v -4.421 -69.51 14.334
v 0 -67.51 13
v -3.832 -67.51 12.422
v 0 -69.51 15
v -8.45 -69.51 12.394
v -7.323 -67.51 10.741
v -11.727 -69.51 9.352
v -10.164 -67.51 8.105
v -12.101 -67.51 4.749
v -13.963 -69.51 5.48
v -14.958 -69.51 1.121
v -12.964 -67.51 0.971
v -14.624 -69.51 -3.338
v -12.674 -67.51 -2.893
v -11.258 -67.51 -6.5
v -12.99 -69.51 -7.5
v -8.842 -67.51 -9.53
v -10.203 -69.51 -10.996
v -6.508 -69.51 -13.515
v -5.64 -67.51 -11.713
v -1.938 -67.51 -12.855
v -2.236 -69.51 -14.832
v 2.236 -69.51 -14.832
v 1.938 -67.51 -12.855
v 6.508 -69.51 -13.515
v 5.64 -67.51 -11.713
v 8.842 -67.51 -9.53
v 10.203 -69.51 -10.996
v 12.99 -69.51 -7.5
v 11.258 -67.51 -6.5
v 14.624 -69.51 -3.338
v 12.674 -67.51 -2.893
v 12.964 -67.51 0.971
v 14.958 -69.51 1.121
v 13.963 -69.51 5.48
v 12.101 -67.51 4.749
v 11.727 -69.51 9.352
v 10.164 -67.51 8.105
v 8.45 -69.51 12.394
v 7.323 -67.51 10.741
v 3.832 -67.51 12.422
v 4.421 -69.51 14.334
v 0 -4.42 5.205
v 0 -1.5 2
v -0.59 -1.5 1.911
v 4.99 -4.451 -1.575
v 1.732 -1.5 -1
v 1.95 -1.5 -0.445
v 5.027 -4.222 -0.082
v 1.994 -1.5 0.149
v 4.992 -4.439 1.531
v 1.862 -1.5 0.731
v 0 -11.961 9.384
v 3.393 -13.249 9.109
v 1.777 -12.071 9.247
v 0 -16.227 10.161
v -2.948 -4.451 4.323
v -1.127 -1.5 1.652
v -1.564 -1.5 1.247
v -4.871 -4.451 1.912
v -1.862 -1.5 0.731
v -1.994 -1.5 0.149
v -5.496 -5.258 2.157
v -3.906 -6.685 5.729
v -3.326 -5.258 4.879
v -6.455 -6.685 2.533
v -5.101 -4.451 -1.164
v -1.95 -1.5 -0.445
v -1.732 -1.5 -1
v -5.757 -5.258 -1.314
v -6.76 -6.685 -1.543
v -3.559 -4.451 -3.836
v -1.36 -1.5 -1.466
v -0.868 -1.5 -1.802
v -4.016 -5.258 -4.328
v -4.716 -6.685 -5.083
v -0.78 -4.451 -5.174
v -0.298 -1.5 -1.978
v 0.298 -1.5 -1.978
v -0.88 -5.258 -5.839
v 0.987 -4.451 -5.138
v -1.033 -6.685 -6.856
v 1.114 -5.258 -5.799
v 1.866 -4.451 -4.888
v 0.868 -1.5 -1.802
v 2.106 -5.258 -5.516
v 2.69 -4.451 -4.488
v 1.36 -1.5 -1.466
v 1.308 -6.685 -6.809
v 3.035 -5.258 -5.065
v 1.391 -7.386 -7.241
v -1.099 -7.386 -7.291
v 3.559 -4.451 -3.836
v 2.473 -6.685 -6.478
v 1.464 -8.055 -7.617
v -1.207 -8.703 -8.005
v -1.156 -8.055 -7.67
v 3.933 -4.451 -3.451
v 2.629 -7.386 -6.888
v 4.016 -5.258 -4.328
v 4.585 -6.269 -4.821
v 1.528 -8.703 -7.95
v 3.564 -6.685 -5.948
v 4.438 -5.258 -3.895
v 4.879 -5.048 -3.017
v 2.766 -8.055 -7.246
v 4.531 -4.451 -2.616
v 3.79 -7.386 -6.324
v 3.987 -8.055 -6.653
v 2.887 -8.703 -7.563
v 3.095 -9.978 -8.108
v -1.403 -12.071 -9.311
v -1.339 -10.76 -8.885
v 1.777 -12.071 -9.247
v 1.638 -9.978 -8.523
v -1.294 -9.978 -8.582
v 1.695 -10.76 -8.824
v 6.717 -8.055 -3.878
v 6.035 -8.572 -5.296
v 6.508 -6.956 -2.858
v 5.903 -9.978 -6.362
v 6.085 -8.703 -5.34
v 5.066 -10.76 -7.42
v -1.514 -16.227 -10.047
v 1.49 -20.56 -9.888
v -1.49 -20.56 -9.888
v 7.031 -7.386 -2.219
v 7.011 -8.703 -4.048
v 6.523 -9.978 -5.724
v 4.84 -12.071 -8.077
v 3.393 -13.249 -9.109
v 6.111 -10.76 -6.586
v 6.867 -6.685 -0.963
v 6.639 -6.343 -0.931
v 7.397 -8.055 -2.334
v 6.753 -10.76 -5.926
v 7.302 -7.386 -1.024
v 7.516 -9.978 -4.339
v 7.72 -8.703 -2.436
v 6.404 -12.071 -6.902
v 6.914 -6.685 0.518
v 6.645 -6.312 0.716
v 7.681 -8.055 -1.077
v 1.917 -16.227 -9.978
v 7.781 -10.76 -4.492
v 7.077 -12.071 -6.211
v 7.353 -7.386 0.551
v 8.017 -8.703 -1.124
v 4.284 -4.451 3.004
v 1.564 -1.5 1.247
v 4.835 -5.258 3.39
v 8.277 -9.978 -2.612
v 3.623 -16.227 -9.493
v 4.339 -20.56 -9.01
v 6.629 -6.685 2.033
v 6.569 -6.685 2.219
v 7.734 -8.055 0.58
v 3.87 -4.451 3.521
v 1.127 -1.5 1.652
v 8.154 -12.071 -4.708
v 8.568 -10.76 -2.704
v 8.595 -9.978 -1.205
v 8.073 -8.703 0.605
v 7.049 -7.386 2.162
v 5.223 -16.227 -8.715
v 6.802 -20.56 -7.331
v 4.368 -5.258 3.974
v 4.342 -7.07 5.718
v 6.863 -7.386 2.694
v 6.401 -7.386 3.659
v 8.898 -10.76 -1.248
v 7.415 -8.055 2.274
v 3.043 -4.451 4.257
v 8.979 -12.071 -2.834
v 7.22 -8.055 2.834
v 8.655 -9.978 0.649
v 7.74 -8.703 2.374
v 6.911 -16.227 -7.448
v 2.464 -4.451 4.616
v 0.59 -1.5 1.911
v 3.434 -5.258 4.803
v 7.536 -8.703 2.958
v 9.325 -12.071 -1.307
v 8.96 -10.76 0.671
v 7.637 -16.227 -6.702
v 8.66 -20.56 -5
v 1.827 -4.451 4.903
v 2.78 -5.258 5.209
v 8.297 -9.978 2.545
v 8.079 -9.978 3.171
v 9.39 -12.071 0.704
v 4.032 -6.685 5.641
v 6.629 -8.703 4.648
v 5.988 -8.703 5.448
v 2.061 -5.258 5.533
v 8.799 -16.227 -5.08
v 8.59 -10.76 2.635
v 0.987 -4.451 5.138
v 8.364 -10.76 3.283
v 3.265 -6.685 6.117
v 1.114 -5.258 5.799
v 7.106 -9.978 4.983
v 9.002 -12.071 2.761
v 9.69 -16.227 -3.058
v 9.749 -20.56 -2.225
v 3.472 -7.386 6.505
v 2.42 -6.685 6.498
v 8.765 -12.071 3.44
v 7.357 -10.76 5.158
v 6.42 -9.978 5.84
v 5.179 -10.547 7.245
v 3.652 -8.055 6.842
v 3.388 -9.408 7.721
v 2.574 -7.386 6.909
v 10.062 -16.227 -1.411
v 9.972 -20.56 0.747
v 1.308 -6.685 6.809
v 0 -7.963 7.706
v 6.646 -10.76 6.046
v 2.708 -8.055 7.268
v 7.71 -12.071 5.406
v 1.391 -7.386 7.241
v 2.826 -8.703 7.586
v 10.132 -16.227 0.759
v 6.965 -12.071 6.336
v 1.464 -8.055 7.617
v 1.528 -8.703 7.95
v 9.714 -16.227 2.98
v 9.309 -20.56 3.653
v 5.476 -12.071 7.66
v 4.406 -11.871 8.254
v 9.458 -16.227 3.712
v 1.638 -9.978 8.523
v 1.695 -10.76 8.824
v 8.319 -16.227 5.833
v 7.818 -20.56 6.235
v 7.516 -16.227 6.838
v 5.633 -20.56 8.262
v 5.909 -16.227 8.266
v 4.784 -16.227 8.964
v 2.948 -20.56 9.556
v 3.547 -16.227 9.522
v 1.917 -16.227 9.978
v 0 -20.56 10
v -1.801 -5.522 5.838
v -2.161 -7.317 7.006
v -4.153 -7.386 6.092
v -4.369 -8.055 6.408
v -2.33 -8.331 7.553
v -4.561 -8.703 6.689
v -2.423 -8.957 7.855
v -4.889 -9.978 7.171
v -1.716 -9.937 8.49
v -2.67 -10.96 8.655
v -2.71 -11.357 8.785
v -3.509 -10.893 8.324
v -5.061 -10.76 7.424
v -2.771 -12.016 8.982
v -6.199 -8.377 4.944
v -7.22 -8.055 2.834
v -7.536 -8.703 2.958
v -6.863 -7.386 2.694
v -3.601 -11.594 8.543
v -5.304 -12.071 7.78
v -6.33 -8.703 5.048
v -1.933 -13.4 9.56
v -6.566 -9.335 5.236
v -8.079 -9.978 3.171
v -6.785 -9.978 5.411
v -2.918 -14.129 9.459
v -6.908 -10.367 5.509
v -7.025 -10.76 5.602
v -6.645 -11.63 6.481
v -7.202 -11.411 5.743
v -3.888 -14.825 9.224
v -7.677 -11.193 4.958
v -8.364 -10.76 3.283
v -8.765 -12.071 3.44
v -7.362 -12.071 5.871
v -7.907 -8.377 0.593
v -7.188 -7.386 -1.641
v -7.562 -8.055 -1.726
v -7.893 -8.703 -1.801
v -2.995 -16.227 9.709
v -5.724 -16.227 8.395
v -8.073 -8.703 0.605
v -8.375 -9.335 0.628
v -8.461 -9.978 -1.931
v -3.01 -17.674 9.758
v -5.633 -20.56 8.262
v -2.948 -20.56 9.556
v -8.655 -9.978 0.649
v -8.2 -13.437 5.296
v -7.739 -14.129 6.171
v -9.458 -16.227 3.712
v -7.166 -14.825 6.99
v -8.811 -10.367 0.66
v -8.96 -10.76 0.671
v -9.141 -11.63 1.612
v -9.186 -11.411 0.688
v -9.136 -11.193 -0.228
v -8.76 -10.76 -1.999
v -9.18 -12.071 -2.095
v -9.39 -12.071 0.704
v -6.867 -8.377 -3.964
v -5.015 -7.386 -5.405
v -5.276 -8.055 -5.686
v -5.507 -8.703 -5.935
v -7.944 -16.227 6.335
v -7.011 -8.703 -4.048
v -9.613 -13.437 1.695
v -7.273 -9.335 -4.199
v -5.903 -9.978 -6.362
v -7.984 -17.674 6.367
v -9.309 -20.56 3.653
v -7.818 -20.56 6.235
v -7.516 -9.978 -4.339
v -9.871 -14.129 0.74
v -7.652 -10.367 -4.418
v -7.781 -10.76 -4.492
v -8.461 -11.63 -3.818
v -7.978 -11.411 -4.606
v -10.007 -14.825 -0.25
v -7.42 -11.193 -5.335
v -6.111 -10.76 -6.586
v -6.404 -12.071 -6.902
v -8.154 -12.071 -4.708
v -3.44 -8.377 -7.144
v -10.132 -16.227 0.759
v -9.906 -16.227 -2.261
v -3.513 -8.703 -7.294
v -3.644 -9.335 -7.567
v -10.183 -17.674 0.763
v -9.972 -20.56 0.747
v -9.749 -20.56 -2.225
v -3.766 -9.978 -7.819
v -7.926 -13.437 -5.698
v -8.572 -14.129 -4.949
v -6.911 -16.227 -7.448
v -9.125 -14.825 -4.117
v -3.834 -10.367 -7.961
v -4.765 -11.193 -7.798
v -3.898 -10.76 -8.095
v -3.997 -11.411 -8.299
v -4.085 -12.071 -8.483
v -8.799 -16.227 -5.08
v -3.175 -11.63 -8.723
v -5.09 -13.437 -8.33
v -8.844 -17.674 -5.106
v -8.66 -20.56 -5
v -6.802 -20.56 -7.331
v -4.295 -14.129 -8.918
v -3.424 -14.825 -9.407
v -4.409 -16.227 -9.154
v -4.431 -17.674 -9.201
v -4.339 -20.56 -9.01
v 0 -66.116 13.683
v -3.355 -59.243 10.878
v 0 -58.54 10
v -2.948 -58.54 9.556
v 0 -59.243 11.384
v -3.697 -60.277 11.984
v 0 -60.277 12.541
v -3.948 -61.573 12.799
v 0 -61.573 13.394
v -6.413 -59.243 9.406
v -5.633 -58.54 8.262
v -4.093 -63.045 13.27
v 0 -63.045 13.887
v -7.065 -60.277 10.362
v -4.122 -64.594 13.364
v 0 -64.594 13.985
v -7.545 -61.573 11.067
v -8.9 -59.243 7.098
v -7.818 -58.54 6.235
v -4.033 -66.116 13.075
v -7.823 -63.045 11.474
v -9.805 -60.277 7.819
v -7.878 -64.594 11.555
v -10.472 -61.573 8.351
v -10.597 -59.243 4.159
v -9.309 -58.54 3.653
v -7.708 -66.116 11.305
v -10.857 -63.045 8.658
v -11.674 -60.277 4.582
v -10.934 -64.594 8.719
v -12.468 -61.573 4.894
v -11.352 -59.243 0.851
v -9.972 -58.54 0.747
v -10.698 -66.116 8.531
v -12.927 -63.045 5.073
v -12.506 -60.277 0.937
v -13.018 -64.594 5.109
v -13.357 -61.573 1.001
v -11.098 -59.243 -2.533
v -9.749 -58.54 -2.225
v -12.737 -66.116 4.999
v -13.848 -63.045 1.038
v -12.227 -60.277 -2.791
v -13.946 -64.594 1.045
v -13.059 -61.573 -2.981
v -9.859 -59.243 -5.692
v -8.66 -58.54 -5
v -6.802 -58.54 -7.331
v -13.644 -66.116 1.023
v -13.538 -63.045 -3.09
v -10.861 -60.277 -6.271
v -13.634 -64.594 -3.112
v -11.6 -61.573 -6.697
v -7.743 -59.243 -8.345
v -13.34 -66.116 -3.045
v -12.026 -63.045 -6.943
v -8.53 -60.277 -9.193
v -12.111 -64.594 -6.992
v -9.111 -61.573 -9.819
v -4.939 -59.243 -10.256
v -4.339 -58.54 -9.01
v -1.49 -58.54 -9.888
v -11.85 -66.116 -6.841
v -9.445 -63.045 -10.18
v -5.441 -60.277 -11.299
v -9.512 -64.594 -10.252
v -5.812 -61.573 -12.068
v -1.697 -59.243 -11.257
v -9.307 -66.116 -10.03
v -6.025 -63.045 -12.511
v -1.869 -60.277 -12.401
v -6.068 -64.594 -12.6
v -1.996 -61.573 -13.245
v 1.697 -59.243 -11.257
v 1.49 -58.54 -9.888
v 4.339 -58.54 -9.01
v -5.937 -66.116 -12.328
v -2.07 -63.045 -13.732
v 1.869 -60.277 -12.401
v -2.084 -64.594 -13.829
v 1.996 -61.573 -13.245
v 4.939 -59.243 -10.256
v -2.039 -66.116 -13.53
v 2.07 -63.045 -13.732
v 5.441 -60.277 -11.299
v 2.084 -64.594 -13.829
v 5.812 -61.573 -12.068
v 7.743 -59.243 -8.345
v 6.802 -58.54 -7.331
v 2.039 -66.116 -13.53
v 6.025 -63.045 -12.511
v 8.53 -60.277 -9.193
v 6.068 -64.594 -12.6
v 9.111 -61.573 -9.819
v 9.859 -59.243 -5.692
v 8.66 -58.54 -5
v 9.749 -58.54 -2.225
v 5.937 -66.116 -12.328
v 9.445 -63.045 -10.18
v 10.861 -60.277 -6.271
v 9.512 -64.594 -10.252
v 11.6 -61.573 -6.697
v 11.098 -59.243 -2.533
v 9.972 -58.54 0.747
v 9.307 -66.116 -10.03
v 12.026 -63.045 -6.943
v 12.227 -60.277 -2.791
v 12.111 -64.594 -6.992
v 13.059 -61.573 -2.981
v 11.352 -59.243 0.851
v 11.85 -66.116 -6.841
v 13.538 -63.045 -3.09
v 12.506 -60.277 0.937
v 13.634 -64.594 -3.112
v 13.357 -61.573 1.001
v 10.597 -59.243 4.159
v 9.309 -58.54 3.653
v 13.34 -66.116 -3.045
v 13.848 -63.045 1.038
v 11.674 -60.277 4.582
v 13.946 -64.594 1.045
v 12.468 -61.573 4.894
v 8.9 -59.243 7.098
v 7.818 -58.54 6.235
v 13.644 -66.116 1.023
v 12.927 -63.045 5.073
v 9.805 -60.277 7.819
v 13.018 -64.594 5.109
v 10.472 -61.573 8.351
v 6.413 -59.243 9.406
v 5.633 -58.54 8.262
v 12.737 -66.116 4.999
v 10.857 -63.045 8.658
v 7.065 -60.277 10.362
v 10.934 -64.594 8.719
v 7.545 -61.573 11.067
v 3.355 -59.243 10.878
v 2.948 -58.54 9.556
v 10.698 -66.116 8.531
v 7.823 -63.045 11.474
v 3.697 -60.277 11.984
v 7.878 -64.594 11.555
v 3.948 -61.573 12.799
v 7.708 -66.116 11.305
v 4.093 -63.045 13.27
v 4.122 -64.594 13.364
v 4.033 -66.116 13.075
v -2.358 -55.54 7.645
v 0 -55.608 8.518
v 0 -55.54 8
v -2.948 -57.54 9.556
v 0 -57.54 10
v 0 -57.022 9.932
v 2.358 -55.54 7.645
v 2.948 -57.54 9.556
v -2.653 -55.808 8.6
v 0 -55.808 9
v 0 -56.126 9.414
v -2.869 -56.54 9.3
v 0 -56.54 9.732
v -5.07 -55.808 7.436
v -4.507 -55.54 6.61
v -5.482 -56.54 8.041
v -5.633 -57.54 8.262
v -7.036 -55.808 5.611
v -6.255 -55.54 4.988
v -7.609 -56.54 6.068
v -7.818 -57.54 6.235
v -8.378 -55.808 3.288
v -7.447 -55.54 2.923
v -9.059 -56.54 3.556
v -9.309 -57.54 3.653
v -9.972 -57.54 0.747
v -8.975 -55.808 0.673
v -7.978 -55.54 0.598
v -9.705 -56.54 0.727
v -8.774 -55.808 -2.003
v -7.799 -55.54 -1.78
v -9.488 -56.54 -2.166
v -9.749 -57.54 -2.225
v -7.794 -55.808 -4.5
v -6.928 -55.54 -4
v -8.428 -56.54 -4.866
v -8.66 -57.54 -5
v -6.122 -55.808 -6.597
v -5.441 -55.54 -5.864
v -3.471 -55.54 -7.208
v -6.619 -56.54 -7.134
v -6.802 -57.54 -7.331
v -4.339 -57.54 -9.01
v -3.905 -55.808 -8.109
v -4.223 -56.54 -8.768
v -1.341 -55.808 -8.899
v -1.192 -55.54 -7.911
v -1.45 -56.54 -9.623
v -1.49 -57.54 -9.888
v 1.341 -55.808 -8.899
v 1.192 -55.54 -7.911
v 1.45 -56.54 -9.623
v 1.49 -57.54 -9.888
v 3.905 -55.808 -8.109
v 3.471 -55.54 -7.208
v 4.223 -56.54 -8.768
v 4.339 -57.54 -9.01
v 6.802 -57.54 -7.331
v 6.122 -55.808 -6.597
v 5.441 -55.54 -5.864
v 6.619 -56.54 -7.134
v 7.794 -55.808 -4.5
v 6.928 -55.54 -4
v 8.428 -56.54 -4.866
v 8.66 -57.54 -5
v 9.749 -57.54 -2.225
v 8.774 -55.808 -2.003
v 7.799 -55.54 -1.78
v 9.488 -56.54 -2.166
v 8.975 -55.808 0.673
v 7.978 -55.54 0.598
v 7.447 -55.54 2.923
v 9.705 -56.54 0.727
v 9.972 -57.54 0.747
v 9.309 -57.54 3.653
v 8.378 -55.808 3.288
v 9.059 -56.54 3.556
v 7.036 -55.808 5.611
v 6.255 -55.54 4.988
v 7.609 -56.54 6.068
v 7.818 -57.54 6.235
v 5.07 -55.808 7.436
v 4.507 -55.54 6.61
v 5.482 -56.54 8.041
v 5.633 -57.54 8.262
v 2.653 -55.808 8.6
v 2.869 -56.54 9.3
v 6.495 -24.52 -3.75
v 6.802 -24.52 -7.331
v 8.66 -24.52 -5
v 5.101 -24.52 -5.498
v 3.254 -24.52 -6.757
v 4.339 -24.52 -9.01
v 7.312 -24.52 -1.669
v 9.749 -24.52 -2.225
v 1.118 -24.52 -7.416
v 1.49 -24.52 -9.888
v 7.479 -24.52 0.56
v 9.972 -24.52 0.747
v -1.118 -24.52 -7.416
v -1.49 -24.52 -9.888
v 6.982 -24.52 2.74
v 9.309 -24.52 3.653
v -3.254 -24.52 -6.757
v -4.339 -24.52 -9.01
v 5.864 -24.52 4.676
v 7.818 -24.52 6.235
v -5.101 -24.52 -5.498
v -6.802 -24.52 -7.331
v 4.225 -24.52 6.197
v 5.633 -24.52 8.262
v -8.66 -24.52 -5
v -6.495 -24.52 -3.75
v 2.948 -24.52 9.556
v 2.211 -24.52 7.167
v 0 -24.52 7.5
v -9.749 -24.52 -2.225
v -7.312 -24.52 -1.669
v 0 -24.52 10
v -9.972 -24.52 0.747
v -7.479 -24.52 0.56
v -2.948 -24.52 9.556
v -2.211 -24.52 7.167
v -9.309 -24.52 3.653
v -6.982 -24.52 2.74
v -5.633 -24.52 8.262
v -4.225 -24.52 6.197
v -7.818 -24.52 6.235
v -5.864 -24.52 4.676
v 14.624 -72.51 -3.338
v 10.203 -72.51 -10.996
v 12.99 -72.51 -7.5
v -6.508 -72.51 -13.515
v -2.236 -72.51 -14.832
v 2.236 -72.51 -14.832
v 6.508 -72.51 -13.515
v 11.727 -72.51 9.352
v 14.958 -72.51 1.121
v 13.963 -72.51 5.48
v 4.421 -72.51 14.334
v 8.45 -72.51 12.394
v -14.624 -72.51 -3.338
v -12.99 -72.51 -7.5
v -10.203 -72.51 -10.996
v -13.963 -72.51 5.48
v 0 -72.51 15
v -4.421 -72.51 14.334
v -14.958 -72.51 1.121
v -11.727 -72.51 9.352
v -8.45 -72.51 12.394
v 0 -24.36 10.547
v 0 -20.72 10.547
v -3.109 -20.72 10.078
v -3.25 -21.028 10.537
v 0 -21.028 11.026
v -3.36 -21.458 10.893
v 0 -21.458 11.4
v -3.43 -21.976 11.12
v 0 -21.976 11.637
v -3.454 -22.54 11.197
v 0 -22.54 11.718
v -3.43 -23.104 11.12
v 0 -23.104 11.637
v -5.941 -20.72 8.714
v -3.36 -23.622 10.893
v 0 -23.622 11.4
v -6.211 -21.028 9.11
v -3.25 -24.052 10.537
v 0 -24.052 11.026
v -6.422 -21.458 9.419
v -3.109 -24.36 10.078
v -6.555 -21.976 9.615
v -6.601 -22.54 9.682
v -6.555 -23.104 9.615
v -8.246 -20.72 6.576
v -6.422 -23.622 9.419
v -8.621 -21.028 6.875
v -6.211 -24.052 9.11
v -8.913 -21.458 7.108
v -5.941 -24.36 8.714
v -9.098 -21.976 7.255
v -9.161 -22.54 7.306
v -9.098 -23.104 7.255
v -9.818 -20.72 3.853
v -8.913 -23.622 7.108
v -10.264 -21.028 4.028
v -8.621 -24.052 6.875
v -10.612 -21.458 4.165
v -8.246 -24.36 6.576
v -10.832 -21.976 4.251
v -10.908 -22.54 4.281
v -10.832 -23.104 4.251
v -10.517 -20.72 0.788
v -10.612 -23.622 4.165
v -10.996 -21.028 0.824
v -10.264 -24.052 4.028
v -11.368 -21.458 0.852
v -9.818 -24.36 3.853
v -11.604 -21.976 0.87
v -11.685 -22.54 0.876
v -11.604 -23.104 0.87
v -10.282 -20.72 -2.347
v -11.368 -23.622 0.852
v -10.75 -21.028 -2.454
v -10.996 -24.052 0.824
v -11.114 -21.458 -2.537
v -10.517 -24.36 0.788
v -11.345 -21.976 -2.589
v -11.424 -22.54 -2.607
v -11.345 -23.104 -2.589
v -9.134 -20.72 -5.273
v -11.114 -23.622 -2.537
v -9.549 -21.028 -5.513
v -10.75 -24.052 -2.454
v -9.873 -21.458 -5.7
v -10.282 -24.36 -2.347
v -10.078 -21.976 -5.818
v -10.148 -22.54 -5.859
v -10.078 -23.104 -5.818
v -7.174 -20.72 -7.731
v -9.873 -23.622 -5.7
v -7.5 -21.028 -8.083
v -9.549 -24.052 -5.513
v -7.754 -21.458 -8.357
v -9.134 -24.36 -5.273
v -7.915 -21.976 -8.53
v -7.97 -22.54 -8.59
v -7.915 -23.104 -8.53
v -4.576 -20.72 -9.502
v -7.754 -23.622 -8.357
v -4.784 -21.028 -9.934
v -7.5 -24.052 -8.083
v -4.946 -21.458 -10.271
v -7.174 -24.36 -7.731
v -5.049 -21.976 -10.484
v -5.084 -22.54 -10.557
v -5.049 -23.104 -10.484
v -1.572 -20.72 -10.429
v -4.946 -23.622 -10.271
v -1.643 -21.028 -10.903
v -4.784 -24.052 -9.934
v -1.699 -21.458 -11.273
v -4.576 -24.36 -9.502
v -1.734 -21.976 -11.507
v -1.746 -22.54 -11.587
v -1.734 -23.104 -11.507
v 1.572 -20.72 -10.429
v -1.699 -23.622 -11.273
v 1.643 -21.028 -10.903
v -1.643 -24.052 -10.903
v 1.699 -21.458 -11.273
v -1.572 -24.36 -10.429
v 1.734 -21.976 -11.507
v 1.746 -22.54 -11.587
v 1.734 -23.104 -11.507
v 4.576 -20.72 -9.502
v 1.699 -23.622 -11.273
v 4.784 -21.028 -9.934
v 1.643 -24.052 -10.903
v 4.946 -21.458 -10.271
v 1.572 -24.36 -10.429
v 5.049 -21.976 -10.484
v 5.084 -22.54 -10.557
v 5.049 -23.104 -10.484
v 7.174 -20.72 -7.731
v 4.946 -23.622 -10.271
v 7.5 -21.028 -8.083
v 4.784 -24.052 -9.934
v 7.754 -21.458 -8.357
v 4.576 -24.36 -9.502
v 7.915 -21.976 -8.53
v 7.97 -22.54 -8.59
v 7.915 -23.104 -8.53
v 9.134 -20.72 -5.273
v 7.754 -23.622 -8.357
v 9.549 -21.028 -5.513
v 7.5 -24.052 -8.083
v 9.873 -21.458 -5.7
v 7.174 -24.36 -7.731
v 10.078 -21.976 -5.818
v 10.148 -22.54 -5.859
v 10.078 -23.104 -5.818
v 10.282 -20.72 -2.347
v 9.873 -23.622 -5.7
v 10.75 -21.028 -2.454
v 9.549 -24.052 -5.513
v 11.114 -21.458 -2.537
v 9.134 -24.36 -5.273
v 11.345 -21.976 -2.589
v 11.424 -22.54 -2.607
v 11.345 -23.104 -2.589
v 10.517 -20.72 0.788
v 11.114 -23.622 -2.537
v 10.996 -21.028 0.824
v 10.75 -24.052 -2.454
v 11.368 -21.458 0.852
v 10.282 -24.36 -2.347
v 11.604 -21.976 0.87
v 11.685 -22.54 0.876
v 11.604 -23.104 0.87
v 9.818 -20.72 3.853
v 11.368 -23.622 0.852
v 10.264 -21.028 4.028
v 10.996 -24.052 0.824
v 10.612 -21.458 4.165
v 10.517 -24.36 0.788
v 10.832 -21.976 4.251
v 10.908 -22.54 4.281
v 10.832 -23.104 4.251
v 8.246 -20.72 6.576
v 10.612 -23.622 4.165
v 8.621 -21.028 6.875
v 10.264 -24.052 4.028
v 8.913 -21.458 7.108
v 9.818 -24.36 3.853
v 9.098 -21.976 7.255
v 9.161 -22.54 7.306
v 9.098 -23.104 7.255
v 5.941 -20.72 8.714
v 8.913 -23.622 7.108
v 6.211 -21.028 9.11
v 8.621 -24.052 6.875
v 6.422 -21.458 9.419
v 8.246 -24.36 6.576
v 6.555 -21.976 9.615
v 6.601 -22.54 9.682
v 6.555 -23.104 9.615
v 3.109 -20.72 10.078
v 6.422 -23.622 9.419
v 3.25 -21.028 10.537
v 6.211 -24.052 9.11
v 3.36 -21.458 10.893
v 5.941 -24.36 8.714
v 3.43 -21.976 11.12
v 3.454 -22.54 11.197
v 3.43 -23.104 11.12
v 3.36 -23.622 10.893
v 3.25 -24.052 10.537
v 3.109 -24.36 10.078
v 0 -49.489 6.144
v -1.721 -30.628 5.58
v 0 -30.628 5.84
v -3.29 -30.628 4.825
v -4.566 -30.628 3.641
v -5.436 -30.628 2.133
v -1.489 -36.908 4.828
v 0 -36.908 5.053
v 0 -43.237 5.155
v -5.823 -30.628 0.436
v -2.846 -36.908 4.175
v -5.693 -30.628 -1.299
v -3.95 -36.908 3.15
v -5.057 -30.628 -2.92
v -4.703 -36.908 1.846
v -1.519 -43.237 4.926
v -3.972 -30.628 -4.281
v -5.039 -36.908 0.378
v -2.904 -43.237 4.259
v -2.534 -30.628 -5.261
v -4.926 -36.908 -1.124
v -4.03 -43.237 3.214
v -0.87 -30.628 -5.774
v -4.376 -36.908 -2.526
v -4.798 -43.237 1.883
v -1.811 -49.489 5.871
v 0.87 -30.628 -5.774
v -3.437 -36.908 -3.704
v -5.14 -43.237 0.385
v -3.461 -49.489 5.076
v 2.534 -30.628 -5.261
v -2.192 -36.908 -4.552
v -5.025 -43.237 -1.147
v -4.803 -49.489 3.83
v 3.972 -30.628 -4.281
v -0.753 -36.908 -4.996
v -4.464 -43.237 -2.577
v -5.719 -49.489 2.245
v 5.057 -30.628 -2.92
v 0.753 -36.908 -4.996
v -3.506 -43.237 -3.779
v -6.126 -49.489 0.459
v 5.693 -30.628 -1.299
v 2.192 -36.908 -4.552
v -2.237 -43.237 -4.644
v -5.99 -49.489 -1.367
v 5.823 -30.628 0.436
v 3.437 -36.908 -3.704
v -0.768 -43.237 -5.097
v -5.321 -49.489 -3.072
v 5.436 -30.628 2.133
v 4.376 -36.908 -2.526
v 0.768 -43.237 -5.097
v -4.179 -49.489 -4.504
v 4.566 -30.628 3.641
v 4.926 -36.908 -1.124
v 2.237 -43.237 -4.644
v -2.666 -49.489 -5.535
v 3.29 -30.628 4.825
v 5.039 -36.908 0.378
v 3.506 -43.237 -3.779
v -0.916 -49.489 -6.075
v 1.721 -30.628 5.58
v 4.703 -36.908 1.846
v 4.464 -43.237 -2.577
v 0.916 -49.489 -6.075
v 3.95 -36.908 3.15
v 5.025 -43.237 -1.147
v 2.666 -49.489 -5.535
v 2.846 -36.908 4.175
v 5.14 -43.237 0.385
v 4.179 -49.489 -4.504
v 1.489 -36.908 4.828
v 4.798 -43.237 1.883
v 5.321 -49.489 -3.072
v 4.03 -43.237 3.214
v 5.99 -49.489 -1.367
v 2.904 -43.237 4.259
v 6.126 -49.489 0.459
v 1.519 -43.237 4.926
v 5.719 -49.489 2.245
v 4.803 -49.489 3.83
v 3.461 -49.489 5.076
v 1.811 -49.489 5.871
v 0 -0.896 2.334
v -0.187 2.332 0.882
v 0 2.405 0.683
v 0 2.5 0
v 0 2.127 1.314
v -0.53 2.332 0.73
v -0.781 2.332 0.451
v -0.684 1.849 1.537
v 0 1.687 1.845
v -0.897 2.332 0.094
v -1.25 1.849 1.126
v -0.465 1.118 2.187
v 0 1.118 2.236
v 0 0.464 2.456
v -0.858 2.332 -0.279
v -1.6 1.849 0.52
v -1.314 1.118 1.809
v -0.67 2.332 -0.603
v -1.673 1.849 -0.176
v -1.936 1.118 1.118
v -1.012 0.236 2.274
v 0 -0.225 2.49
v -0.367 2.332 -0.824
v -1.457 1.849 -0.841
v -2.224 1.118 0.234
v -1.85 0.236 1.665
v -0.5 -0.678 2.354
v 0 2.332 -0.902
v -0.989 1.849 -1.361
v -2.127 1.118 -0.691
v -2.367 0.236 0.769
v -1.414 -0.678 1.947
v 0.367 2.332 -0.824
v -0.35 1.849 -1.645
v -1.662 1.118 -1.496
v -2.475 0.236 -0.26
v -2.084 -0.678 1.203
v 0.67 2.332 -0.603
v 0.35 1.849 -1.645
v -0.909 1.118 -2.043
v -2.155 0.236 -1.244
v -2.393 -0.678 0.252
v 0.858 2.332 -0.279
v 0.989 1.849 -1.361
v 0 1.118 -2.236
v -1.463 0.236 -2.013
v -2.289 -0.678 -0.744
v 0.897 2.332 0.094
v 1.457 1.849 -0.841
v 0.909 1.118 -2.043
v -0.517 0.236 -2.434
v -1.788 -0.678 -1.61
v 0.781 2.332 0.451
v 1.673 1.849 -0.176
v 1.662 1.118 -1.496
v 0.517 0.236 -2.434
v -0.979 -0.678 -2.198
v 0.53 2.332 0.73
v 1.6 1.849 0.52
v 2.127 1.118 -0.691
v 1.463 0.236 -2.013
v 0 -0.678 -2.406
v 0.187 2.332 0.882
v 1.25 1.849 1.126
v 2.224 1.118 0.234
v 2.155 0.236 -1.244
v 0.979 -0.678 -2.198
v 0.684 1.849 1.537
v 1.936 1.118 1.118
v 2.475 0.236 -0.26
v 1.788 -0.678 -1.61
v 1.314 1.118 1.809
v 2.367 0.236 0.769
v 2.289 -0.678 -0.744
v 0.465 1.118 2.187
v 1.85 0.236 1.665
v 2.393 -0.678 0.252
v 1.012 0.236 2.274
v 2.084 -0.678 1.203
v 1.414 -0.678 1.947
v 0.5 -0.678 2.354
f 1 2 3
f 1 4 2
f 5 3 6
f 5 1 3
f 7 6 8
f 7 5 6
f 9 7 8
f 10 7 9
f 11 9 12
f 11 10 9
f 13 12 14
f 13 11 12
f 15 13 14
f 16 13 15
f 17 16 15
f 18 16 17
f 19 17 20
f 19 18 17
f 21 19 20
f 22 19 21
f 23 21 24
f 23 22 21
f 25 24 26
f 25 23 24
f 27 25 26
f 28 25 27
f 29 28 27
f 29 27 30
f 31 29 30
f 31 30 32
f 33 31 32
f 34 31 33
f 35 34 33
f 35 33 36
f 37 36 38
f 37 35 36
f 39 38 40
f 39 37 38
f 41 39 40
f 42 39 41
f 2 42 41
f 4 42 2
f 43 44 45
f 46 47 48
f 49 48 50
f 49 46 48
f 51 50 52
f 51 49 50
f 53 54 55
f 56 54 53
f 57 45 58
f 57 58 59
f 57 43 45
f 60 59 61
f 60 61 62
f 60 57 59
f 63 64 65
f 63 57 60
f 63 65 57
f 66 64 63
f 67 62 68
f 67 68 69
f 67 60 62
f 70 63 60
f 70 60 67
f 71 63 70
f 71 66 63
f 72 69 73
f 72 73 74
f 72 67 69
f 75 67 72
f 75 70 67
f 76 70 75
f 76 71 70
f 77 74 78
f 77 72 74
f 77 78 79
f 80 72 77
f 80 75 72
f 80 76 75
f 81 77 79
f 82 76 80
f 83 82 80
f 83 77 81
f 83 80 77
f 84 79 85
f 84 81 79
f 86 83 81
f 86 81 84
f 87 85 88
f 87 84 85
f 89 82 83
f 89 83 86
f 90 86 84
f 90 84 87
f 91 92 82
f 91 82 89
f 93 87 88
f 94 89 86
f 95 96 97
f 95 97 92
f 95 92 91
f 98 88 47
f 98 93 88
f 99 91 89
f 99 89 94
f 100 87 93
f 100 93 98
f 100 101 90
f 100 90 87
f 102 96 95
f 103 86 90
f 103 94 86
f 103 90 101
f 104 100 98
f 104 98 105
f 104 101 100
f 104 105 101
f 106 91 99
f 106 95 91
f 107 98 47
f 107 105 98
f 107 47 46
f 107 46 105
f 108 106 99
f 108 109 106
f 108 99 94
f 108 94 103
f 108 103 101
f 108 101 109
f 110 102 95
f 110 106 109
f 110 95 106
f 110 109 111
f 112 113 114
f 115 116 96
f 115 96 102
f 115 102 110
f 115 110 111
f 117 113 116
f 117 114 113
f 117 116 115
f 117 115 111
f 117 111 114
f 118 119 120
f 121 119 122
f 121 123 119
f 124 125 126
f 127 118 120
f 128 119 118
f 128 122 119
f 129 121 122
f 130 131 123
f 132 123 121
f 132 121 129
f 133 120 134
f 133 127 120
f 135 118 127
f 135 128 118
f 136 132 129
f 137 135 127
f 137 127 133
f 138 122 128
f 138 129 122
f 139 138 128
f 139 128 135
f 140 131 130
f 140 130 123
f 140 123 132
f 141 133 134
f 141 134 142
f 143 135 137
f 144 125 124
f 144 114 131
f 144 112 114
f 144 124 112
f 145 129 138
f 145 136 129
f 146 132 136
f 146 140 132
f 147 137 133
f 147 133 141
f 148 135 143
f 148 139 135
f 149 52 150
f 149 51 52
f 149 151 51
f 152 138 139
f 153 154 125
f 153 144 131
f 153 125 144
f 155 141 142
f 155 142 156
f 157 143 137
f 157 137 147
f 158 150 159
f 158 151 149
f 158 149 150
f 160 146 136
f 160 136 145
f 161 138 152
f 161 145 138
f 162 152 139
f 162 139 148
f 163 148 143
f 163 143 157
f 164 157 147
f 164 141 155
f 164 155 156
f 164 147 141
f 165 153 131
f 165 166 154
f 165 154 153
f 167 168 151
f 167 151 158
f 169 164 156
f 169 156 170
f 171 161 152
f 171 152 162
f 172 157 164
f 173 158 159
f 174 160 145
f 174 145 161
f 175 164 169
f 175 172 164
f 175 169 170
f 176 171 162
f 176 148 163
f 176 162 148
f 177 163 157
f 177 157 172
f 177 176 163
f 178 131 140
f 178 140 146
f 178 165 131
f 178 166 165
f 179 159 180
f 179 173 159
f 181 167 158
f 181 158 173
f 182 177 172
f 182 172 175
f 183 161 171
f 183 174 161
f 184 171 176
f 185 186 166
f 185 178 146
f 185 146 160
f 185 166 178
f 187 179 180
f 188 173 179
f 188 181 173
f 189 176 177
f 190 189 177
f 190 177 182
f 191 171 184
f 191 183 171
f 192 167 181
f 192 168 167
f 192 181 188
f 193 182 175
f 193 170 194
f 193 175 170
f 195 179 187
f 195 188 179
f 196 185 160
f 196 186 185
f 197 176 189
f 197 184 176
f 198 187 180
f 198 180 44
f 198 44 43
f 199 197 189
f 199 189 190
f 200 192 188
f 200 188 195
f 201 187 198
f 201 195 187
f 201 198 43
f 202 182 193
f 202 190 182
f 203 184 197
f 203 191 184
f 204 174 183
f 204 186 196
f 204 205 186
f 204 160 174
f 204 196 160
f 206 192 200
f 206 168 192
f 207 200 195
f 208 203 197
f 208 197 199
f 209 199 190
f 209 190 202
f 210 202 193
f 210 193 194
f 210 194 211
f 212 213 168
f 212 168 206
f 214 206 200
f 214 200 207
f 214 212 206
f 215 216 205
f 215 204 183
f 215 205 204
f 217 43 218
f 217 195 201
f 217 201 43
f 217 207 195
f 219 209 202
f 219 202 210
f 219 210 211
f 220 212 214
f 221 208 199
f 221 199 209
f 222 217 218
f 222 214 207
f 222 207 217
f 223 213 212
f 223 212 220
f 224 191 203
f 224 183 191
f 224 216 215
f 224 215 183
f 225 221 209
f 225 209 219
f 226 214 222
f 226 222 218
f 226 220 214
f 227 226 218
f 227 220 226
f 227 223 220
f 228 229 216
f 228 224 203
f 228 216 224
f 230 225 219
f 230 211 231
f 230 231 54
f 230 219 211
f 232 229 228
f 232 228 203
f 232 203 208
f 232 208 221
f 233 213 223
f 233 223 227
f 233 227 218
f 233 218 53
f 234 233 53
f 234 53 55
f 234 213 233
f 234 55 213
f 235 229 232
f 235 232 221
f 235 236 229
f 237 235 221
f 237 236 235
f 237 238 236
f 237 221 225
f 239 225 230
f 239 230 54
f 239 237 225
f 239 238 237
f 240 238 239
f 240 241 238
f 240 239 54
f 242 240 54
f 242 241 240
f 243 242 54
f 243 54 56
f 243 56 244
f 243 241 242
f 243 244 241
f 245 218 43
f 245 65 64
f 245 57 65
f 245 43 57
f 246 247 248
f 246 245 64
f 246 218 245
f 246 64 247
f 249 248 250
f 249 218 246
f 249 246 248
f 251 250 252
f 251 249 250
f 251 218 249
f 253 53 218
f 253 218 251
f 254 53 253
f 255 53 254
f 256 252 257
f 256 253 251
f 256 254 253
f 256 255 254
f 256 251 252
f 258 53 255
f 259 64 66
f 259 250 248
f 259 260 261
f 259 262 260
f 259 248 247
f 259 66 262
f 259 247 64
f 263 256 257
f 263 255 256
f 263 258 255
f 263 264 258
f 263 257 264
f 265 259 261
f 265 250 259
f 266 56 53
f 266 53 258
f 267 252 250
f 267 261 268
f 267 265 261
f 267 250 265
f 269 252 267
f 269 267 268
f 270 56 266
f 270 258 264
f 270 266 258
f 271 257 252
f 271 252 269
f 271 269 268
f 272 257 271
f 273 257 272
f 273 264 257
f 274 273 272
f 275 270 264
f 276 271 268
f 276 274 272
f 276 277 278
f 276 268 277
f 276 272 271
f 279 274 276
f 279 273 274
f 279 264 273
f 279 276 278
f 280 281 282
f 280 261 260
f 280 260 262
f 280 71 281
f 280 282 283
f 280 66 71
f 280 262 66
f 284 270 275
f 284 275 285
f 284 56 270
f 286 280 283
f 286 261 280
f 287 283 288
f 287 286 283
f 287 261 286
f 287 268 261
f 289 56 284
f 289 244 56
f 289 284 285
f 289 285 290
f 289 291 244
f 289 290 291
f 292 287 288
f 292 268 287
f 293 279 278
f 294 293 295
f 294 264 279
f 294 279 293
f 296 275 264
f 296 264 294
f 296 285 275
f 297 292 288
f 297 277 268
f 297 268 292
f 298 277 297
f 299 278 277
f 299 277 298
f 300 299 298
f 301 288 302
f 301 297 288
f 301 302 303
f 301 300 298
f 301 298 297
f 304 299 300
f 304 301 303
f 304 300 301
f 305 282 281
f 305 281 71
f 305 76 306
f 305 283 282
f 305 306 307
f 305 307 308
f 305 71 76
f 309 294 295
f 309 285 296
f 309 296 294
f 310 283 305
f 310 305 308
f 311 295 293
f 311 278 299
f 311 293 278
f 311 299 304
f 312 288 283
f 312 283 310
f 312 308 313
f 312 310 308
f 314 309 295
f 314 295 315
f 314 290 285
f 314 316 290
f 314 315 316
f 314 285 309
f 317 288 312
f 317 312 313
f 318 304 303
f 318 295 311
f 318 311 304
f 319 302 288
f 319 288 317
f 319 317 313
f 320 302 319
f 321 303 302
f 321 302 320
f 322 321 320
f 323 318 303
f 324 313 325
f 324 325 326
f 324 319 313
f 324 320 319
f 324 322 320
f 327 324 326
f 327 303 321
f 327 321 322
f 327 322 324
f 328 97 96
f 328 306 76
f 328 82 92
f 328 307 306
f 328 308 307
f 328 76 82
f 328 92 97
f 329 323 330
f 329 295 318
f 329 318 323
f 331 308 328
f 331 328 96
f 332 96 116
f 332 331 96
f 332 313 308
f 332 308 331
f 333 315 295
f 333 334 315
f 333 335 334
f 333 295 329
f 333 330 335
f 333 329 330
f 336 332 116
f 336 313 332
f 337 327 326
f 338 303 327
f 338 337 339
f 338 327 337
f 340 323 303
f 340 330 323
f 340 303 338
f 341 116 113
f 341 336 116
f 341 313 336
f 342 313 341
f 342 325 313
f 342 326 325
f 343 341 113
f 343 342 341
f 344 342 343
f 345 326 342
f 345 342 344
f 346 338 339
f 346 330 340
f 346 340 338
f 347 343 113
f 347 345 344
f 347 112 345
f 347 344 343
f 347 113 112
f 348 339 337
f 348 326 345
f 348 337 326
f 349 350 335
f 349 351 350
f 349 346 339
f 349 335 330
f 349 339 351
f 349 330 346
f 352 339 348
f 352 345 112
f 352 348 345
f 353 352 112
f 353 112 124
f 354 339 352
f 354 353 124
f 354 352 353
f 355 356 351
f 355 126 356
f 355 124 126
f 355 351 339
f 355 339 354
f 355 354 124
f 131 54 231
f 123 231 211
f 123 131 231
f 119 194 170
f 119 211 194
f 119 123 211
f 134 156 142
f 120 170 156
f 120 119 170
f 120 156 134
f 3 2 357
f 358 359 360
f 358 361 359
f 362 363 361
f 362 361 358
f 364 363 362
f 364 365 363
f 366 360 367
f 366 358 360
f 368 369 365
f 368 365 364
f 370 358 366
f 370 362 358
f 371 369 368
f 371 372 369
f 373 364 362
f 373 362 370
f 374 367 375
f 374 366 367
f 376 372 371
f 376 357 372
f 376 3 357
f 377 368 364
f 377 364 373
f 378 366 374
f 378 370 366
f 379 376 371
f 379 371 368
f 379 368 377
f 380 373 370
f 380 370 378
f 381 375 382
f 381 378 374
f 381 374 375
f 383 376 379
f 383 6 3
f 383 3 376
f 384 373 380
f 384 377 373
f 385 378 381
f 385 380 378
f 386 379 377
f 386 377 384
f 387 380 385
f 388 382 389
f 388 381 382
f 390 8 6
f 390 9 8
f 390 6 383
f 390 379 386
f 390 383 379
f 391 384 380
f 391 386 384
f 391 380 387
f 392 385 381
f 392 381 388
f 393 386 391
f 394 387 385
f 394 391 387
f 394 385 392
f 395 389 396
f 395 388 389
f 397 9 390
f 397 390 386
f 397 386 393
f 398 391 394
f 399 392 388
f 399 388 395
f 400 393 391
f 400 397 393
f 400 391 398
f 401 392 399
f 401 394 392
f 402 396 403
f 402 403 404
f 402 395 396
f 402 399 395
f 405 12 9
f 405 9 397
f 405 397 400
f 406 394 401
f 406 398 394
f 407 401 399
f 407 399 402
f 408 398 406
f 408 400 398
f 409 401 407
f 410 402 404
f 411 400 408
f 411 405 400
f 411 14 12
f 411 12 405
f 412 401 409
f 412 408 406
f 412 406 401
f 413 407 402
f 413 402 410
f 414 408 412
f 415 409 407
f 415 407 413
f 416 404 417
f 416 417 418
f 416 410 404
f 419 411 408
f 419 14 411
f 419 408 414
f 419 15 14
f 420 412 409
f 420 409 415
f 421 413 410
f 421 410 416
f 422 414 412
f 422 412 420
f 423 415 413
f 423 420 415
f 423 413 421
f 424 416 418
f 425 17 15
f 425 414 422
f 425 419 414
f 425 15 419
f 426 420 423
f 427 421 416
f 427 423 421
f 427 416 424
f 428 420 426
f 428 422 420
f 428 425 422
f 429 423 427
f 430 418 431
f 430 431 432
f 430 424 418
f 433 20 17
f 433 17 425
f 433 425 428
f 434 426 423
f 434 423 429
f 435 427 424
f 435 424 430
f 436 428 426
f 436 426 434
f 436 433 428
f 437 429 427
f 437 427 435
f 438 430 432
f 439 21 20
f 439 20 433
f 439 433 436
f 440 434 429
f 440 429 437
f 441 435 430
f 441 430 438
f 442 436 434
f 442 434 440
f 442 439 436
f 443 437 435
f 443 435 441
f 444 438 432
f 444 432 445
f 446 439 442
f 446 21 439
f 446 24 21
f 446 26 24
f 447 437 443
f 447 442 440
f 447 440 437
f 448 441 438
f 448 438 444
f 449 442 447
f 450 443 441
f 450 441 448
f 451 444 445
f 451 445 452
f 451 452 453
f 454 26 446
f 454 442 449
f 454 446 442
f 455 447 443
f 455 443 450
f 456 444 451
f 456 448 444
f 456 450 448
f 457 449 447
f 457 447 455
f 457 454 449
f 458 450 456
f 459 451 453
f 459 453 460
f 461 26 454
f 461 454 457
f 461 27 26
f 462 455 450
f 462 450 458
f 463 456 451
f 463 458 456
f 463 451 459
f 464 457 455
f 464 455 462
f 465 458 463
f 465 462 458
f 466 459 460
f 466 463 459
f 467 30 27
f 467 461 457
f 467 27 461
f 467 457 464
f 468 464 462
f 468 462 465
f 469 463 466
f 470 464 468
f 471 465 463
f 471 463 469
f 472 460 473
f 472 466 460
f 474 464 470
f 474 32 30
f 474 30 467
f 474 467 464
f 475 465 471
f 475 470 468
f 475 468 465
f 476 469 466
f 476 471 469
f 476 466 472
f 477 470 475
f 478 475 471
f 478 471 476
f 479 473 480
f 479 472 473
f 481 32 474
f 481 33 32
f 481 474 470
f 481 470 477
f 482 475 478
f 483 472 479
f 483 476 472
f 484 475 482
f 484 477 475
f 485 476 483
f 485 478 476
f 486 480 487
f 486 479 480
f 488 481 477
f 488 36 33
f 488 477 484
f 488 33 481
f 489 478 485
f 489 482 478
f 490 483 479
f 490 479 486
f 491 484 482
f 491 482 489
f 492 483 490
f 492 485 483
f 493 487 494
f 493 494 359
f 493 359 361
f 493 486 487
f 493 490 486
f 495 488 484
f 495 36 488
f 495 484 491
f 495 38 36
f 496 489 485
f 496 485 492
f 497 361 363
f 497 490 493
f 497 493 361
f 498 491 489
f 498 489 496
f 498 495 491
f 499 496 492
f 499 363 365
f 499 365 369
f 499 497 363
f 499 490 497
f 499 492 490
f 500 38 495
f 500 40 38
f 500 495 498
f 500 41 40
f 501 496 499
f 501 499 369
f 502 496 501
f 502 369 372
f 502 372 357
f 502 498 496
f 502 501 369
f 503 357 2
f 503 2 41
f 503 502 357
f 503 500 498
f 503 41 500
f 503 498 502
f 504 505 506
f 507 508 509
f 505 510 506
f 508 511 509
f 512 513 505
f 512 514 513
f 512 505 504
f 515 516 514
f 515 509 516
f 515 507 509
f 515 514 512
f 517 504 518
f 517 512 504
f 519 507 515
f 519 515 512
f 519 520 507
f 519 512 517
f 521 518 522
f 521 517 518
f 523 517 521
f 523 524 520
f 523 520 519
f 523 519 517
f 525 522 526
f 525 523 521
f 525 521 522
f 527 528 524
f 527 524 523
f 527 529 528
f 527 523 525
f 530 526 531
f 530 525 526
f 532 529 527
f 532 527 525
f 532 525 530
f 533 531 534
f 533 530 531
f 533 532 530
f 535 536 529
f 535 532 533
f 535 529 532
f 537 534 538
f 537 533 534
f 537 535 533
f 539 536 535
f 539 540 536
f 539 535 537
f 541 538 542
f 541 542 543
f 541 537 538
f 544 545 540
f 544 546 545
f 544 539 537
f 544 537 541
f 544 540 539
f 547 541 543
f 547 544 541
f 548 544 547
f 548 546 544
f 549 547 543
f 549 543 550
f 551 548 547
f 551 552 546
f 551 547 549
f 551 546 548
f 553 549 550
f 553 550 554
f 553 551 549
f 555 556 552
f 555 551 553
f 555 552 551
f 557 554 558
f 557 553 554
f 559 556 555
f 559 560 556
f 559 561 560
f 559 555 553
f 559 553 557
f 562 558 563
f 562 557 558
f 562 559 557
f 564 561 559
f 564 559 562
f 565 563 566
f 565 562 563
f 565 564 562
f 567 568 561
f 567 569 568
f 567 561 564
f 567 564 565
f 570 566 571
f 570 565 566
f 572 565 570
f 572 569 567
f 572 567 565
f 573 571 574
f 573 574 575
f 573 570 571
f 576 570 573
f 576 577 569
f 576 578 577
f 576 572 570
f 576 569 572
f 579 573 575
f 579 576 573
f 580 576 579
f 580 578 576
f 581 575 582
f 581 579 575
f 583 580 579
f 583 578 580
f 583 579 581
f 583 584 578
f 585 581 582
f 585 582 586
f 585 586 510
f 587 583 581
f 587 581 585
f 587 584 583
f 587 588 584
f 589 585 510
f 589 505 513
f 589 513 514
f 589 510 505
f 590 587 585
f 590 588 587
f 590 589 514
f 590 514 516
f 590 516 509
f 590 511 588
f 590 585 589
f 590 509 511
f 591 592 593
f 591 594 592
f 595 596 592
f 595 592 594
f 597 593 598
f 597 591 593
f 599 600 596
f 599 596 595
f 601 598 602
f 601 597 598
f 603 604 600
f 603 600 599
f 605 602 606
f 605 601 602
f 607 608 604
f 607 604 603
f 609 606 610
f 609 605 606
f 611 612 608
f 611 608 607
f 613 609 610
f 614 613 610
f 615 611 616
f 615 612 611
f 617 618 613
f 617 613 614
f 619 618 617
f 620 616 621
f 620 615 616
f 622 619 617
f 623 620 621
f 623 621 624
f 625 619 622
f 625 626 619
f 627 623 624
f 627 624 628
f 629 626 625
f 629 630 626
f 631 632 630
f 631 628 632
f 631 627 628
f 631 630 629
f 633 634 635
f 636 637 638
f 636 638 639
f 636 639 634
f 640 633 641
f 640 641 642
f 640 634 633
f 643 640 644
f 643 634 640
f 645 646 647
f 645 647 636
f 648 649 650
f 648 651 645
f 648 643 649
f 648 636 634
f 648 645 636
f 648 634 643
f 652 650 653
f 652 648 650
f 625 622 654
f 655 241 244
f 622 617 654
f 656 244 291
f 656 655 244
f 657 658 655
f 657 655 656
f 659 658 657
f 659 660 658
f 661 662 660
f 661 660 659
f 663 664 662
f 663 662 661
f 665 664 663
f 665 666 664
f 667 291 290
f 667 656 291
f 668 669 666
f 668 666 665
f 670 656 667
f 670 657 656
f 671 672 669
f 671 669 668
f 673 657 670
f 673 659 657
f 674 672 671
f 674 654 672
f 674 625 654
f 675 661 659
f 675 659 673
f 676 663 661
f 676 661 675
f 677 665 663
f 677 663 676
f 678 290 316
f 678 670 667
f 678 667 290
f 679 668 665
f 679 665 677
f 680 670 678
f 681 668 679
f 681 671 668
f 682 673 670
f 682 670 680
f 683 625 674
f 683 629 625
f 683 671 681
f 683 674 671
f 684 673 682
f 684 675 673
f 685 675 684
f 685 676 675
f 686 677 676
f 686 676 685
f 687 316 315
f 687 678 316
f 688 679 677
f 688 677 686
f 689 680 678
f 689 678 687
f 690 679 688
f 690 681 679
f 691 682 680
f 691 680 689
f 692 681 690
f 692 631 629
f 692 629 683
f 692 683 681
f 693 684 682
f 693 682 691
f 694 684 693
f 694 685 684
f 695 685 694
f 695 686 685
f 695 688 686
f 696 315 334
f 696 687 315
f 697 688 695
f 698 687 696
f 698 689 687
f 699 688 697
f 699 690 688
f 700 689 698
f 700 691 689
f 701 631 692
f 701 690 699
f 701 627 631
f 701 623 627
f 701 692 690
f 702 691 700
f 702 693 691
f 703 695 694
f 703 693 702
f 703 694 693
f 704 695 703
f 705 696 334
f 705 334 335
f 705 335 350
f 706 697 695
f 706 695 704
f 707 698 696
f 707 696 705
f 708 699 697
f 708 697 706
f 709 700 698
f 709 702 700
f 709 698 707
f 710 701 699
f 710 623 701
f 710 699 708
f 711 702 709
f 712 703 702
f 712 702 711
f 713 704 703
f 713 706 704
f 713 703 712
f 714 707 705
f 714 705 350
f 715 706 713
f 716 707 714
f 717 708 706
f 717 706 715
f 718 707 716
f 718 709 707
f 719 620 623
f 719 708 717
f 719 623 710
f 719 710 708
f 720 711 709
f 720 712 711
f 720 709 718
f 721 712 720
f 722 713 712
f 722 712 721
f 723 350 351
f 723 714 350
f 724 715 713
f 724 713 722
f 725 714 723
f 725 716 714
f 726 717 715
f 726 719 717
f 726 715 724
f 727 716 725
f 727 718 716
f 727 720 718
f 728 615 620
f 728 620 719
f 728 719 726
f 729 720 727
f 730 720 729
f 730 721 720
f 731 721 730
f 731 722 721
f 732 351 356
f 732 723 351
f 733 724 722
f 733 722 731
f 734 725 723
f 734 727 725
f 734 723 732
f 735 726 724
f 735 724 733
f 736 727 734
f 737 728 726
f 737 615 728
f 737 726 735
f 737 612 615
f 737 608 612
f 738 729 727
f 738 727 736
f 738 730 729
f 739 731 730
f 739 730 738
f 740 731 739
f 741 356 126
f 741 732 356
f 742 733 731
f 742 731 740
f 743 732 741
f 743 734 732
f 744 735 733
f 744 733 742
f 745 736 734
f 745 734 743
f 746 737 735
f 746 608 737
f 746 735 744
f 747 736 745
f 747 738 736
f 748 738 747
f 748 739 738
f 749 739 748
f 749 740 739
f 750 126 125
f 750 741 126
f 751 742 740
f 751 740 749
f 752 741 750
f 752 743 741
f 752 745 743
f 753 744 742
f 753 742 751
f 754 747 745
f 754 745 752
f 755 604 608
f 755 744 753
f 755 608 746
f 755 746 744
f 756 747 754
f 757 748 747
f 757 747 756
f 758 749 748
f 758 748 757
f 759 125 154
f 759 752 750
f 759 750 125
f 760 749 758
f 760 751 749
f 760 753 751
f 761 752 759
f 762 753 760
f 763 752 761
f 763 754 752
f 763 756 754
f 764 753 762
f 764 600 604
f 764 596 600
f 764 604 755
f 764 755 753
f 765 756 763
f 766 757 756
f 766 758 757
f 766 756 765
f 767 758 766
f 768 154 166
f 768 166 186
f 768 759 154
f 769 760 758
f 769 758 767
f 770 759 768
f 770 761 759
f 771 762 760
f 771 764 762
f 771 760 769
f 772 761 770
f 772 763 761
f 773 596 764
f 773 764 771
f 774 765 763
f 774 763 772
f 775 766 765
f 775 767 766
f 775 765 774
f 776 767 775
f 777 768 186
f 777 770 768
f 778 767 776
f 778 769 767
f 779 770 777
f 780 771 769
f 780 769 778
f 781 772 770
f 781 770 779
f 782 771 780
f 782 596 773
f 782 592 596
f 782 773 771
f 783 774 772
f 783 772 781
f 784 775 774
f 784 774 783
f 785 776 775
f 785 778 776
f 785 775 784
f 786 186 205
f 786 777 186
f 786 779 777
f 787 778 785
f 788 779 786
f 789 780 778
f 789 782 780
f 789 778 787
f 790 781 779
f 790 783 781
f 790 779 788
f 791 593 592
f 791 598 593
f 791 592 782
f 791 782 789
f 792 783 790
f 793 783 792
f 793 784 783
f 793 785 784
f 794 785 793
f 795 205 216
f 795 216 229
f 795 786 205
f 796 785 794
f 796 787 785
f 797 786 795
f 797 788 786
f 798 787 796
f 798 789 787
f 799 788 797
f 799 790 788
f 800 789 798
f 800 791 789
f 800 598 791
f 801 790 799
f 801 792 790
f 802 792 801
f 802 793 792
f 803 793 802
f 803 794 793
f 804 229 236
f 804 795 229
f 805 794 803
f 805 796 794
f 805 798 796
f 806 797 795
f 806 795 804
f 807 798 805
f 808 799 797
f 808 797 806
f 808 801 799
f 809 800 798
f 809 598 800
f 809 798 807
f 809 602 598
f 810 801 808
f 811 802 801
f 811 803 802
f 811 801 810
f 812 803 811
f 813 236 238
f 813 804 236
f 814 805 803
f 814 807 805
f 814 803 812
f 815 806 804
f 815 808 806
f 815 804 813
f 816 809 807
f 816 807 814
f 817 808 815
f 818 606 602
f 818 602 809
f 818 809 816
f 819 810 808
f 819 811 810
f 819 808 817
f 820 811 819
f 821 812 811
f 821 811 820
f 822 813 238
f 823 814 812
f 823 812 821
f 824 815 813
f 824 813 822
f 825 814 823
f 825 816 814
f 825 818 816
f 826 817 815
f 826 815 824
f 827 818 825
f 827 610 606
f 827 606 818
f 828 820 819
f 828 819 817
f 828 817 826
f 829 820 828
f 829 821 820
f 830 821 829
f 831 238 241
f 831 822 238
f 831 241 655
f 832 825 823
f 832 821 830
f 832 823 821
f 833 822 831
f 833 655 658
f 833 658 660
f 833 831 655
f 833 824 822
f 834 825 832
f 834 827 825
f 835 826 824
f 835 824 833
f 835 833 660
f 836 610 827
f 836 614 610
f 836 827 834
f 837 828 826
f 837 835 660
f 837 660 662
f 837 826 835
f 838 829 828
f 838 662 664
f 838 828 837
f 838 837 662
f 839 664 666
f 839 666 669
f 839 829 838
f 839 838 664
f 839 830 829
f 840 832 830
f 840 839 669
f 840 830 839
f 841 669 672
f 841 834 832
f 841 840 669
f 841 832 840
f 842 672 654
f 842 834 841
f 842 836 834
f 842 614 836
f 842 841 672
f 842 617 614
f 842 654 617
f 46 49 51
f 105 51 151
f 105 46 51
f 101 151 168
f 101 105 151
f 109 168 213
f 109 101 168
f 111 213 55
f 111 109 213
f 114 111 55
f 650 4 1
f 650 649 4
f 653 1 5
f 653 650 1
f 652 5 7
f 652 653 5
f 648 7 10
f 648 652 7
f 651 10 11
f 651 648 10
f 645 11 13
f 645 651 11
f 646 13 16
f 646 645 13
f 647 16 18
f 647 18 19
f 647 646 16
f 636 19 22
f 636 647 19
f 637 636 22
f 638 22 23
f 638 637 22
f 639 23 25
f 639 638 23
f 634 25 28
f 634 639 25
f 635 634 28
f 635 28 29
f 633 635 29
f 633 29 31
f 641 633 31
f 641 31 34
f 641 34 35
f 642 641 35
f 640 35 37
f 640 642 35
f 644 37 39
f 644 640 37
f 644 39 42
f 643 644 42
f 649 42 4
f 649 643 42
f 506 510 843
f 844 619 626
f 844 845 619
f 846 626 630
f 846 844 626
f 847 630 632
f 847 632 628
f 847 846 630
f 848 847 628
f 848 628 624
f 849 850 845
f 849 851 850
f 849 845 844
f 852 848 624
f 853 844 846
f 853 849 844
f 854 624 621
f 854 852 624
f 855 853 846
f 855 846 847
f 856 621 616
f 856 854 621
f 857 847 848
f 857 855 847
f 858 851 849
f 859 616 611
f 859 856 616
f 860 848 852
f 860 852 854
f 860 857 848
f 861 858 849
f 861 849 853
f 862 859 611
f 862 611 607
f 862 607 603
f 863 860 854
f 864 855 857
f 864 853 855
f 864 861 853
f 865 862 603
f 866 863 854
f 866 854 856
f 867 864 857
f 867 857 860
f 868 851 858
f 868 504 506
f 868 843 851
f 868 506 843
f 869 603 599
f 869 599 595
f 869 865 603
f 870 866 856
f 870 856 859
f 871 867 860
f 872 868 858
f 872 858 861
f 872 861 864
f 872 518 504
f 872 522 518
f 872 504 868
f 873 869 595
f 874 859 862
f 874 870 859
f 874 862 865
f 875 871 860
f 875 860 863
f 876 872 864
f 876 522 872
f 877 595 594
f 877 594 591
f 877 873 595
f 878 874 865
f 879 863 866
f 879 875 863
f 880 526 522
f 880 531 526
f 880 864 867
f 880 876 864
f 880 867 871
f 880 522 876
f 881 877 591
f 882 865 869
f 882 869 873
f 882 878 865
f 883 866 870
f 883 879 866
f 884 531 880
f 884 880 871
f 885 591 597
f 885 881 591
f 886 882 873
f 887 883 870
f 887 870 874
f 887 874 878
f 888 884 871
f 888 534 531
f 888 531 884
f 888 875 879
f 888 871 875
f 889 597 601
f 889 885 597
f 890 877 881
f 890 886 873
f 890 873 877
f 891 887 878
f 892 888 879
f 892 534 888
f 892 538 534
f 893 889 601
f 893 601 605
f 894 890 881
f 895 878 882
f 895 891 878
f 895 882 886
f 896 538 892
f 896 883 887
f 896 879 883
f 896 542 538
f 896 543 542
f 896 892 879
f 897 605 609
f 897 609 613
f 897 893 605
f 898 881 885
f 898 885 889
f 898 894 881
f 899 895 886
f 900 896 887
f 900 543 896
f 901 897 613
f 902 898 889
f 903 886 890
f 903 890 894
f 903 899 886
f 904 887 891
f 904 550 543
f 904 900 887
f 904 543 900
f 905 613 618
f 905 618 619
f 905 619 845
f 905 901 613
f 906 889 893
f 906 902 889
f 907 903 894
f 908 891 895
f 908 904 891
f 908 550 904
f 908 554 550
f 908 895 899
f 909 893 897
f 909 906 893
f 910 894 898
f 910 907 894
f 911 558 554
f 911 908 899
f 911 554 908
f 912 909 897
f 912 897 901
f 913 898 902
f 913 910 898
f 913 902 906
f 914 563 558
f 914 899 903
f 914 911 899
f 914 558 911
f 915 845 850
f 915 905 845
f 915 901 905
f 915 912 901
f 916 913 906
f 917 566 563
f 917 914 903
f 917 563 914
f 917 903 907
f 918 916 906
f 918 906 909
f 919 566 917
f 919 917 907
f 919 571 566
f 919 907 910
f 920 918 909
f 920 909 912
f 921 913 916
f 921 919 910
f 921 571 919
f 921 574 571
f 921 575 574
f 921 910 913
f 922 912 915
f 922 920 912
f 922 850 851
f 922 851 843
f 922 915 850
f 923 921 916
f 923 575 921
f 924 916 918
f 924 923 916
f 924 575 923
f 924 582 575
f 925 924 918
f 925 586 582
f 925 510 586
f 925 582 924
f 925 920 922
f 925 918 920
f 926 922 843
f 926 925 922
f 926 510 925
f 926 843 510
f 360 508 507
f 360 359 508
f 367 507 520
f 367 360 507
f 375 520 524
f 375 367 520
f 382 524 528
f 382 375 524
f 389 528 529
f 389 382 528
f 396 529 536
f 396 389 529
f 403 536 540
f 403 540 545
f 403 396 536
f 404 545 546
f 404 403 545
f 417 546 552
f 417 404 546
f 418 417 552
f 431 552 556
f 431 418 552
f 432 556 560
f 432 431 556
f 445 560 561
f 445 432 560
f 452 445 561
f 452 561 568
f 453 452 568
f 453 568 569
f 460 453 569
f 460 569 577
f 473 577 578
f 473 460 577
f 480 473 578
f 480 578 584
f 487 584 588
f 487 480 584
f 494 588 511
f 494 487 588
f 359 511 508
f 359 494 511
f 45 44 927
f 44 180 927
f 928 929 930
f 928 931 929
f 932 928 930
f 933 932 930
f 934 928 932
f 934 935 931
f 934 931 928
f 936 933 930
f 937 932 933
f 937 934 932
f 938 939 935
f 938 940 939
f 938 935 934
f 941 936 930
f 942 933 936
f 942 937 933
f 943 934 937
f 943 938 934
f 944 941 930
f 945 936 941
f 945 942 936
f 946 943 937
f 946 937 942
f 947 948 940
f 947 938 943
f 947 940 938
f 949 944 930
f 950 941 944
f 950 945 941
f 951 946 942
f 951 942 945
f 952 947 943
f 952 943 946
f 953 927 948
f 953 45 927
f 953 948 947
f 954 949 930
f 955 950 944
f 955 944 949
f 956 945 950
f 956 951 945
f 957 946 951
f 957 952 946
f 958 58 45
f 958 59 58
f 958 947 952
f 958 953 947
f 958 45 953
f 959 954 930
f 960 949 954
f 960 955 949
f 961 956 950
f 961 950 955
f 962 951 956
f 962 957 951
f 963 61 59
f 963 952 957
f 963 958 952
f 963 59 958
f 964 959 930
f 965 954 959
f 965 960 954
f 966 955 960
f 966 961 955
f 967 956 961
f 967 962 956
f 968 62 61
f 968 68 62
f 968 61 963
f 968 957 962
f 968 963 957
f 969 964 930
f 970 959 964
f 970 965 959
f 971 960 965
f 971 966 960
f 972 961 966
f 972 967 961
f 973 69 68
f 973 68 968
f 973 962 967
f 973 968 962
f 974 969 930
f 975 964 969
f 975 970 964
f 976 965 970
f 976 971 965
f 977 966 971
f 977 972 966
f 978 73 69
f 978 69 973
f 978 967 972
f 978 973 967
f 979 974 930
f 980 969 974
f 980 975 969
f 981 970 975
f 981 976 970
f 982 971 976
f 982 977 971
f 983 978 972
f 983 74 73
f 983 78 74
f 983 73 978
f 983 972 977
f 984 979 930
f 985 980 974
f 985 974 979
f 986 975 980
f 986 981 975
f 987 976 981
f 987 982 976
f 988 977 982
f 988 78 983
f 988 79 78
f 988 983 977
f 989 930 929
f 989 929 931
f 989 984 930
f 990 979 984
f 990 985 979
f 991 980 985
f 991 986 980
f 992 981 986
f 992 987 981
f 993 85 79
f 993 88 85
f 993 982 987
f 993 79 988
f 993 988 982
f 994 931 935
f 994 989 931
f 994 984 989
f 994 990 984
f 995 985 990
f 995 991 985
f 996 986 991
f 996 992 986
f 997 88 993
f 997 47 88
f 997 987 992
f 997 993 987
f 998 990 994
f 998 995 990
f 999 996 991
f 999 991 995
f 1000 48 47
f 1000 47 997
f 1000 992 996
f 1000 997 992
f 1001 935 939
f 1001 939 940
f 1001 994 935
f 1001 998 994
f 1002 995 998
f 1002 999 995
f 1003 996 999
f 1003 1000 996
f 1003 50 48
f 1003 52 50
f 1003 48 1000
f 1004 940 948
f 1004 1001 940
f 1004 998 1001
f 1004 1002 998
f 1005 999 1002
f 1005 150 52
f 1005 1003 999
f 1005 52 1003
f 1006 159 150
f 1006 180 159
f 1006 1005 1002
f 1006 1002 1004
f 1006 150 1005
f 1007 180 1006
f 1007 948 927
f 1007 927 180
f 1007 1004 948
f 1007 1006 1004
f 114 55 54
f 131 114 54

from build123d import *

# Parameters (mm, degrees)
KES_EKSTR_ZYON1_DEPTH      = 76.5493223
KES_EKSTR_ZYON1_DEPTH_BACK = 76.5493223


with BuildPart() as part:
    # Çizim1 → Döndür4 (revolve)
    with BuildSketch(Plane.XY, mode=Mode.PRIVATE) as d_nd_r4_sk:
        with BuildLine():
            Line((-15, -72.51), (0, -72.51))
            Line((0, -72.51), (0, 2.5))
            ThreePointArc((0, 2.5), (-2.236067977, 1.118033989), (-2, -1.5))
            ThreePointArc((-2, -1.5), (-8.653286276, -9.916343641), (-10, -20.56))
            ThreePointArc((-10, -20.56), (-11.71786528, -22.54), (-10, -24.52))
            Line((-10, -24.52), (-7.5, -24.52))
            ThreePointArc((-7.5, -24.52), (-4.992249752, -40.074451165), (-8, -55.54))
            ThreePointArc((-8, -55.54), (-9.414213562, -56.125786438), (-10, -57.54))
            Line((-10, -57.54), (-10, -58.54))
            ThreePointArc((-10, -58.54), (-13.688325627, -62.293118519), (-13, -67.51))
            Line((-13, -67.51), (-15, -69.51))
            Line((-15, -69.51), (-15, -72.51))
        make_face()
    revolve(d_nd_r4_sk.sketch.rotate(Axis((0, 9.942203098, 0), (0, -1, 0)), 270), axis=Axis((0, 9.942203098, 0), (0, -1, 0)))

    # Çizim2 → Kes-Ekstrüzyon1 (cut, two sides: drawn at the far end of the back side and taken through both)
    with BuildSketch(Plane.XY.offset(-KES_EKSTR_ZYON1_DEPTH_BACK)):
        with BuildLine():
            Line((1.7767843, -12.070571406), (3.393042446, -13.248583842))
            ThreePointArc((3.393042446, -13.248583842), (5.4656679, -9.965335521), (6.652988107, -6.268611764))
            ThreePointArc((6.652988107, -6.268611764), (5.873557548, -5.218434009), (5.027158096, -4.221441894))
            ThreePointArc((5.027158096, -4.221441894), (3.871676467, -8.34051455), (1.7767843, -12.070571406))
        make_face()
    extrude(amount=KES_EKSTR_ZYON1_DEPTH + KES_EKSTR_ZYON1_DEPTH_BACK, mode=Mode.SUBTRACT)


solid = part.part
